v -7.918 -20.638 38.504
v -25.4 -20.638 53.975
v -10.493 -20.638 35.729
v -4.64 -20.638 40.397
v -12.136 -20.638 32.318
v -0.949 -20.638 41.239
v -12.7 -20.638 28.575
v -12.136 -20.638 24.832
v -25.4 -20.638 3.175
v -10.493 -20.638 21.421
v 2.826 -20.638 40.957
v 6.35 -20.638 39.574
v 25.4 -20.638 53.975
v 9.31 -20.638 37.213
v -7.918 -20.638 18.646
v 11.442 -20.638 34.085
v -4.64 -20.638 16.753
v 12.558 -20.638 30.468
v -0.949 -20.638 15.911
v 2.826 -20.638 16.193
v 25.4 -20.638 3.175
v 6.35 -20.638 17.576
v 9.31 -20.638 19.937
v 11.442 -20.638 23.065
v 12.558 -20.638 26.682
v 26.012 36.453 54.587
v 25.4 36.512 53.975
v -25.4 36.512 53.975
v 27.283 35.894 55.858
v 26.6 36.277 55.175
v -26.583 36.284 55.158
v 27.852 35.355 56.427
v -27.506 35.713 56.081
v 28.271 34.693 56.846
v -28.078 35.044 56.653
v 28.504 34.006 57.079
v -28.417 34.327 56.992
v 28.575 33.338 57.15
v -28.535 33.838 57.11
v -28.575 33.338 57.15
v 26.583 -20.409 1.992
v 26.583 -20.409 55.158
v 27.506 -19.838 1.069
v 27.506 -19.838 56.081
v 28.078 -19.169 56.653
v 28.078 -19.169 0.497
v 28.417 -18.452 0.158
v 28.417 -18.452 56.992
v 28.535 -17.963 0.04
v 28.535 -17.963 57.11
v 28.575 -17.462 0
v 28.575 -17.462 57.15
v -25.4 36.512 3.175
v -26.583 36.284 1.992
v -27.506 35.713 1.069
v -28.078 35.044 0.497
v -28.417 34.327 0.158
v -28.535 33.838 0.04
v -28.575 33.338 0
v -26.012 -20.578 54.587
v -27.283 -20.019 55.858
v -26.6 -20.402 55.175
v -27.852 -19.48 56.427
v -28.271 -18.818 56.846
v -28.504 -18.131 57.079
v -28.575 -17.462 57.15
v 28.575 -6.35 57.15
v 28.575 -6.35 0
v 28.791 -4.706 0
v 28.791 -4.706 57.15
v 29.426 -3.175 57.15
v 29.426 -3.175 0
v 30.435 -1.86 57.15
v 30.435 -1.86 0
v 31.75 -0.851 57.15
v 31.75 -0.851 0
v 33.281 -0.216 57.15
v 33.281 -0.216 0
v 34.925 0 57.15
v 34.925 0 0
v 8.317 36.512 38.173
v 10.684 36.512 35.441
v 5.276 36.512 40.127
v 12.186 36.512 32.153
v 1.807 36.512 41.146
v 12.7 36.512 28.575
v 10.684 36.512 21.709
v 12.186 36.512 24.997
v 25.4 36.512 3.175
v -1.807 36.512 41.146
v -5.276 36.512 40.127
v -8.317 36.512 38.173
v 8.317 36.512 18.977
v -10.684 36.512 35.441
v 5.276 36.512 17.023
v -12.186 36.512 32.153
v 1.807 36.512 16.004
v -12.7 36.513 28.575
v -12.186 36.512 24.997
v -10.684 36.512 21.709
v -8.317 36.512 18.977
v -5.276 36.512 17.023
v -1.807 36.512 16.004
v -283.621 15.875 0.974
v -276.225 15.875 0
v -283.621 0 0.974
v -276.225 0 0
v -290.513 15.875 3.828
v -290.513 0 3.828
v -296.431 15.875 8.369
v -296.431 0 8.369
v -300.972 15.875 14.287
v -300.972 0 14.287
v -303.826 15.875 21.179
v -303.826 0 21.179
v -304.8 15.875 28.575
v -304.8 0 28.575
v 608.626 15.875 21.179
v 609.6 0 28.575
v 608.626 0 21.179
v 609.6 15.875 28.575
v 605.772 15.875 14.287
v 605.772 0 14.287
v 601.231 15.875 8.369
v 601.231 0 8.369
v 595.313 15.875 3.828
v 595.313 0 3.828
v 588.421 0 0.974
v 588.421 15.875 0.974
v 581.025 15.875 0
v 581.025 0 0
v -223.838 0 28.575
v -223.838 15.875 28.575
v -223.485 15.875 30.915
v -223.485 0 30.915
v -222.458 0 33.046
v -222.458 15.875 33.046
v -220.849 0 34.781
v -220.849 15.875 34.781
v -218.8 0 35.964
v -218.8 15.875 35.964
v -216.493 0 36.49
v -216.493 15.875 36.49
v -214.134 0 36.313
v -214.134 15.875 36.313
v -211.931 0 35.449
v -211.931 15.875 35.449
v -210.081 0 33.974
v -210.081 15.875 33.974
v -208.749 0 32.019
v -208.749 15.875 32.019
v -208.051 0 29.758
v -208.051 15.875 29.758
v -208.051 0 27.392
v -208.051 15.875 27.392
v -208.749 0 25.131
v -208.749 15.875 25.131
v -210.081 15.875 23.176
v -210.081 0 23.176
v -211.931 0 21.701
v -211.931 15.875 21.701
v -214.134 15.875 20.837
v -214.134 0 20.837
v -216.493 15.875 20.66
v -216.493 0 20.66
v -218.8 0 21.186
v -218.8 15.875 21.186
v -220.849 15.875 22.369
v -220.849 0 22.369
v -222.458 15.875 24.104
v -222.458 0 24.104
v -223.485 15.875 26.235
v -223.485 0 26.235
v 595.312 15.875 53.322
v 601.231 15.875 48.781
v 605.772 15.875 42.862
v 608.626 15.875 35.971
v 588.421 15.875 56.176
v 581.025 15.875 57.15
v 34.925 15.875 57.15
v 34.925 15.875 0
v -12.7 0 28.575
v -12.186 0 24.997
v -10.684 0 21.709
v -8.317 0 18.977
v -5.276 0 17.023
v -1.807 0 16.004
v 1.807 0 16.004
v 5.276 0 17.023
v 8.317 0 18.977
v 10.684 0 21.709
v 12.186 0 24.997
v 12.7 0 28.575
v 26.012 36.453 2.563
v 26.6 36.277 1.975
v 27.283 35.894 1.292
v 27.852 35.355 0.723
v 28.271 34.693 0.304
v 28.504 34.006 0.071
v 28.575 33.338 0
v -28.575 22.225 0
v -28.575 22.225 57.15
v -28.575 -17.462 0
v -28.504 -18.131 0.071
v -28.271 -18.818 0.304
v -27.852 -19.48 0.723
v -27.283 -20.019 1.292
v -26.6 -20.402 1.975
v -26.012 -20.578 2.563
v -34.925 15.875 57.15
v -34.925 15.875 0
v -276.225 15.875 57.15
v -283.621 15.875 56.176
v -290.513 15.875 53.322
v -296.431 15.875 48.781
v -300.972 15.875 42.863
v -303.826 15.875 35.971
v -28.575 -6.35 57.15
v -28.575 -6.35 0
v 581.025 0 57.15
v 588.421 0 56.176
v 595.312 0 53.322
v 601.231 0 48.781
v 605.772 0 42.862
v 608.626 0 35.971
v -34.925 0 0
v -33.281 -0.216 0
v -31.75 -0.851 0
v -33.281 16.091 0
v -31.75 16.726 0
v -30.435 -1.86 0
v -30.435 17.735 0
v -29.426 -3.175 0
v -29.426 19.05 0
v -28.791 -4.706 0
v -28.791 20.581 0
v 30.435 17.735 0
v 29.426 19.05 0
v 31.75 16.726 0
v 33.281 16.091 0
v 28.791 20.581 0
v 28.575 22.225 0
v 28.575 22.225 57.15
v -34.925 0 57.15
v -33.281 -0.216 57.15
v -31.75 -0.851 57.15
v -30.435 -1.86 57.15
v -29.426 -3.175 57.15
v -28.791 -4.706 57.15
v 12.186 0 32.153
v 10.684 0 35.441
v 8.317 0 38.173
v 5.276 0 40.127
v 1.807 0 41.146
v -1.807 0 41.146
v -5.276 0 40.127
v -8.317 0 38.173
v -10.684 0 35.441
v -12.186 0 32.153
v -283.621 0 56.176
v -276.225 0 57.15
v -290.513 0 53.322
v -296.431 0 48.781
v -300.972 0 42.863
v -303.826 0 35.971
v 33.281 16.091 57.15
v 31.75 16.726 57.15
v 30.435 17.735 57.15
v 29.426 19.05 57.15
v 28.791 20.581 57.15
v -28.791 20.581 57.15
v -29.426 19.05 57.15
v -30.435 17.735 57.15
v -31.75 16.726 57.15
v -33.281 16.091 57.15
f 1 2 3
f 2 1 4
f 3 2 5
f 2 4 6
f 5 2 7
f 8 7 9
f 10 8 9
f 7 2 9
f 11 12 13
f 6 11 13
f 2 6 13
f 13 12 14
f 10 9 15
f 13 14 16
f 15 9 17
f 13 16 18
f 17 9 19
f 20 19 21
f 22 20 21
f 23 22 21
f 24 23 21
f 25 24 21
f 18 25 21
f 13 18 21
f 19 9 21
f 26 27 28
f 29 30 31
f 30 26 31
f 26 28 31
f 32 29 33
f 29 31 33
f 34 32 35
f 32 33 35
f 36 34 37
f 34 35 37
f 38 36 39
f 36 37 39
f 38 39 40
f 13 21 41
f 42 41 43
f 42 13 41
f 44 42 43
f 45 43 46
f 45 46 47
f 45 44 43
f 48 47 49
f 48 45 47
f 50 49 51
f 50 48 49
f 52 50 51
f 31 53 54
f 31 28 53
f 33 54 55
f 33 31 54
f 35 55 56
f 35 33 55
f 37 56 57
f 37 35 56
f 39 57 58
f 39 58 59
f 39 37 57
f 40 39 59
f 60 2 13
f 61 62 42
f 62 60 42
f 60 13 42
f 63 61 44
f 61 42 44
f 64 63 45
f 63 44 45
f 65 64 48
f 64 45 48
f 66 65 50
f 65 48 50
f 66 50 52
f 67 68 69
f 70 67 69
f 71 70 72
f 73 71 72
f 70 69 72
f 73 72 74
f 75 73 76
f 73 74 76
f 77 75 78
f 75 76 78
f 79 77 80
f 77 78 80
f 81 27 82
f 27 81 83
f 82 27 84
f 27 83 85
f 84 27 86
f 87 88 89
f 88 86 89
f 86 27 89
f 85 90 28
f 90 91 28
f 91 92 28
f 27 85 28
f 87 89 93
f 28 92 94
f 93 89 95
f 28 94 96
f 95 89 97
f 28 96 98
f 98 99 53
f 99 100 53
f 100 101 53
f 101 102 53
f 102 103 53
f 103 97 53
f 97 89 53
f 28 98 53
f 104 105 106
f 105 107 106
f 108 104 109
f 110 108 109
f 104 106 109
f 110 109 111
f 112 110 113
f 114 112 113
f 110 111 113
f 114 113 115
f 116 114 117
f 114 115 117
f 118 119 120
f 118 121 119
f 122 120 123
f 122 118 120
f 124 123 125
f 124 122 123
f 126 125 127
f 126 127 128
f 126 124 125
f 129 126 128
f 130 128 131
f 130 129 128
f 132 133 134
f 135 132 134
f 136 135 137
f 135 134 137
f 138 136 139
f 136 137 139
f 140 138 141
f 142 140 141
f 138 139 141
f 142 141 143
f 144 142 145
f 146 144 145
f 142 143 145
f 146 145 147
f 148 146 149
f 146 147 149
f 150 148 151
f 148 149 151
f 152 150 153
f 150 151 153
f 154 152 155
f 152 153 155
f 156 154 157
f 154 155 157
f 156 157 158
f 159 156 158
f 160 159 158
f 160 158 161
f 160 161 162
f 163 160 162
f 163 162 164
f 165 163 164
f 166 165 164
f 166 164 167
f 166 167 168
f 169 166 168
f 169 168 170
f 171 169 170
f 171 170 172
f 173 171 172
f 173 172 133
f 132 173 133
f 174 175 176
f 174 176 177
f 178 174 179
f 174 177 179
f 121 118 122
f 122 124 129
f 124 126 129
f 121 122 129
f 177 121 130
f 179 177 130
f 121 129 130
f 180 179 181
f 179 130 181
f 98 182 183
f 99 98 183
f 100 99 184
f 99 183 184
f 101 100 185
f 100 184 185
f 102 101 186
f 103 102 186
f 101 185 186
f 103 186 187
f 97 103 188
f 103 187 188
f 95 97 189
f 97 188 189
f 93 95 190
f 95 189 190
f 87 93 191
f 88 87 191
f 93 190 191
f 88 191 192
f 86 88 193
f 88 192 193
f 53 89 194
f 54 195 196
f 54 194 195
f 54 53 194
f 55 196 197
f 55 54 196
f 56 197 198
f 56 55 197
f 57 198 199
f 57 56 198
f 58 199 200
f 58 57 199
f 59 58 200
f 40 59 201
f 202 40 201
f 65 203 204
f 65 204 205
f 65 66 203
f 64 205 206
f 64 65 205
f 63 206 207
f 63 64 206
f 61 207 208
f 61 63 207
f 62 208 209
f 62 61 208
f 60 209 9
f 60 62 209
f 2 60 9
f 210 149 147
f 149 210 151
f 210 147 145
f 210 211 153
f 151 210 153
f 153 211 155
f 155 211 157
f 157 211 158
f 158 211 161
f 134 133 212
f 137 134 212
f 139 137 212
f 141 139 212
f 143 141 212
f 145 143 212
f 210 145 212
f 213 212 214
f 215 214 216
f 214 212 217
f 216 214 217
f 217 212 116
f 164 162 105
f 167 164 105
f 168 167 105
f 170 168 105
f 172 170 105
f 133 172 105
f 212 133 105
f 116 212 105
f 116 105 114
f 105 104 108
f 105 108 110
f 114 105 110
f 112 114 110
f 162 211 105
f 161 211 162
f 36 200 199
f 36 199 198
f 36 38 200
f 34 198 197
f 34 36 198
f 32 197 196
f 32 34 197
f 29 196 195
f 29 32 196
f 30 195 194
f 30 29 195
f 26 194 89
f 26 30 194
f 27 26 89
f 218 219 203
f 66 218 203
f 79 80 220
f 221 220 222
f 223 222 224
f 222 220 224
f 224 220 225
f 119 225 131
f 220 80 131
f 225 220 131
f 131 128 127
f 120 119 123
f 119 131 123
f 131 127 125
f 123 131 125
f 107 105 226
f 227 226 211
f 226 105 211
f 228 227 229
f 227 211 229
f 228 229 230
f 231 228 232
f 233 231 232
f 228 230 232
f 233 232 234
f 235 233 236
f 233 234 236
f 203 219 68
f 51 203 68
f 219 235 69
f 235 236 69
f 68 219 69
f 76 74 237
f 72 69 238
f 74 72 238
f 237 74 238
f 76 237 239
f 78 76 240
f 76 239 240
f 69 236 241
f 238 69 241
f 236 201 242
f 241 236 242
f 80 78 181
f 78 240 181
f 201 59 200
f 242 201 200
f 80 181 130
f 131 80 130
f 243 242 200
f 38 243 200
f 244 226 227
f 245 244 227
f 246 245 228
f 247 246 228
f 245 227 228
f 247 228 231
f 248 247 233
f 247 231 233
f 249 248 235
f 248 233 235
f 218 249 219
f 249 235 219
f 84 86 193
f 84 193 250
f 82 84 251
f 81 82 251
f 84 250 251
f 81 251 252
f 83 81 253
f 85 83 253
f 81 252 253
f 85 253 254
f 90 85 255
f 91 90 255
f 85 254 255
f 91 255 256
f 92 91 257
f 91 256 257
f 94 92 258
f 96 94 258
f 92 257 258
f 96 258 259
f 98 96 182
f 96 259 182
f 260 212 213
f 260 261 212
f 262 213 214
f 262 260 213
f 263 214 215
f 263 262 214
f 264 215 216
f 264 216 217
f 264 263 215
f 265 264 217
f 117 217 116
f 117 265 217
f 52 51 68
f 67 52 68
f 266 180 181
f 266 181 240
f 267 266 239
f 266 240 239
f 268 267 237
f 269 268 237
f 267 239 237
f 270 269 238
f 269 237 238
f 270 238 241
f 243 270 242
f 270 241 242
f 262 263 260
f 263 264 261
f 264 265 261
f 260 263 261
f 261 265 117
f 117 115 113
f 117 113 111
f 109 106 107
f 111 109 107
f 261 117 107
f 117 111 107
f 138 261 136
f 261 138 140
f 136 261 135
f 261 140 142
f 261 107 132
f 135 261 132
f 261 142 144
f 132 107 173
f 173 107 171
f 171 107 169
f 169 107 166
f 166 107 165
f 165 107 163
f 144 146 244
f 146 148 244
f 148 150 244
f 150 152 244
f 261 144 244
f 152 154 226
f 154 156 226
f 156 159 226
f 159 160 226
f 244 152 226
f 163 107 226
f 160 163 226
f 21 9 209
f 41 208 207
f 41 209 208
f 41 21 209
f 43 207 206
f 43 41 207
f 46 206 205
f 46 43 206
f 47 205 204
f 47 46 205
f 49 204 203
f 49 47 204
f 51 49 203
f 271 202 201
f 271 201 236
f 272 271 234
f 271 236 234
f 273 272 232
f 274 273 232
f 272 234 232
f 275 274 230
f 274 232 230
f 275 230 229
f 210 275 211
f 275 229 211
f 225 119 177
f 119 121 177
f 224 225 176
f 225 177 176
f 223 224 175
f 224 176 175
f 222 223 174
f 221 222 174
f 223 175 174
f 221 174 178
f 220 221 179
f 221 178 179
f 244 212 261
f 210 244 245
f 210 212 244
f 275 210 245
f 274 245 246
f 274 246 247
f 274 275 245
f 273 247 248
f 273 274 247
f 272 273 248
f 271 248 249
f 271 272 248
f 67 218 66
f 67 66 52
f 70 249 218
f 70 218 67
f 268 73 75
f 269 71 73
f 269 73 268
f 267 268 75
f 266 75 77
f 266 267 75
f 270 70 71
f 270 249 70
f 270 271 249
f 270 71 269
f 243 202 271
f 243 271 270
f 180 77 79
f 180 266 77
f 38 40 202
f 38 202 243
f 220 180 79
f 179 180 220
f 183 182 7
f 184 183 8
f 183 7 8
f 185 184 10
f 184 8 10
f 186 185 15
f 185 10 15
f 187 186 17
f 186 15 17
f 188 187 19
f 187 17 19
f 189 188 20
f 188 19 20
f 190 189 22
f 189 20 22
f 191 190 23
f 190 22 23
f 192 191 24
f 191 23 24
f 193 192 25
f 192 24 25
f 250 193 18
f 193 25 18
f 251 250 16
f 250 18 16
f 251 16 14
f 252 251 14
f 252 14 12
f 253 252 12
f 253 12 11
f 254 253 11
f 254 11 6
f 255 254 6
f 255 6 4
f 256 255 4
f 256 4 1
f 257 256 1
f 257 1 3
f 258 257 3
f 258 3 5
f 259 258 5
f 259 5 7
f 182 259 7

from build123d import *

# Parameters (mm, degrees)
F1_DEPTH = 57.15
F2_R     = 3.175
F3_R     = 28.57499
F4_R     = 28.575
F5_R     = 28.57499
F7_D     = 15.875
F8_D     = 25.4
F8_DEPTH = 38.1
F8_TIP   = 7.6309298617
F9_D     = 25.4


# Not quite as in the source:
# - a fillet or chamfer is up to 0.001 mm smaller than in the source, because OpenCascade refuses the exact size
# - a length typed as a fraction of an inch, garbled in the dataset ("3 / 203.2 mm" for 3/8 in), is restored


with BuildPart() as f1:
    # F0 (on Top) → F1 (new body)
    with BuildSketch(Plane.XY):
        with BuildLine():
            ThreePointArc((28.575, -6.35), (30.4348719395, -1.8598719395), (34.925, 0))
            Line((34.925, 0), (609.6, 0))
            Line((609.6, 0), (609.6, 15.875))
            Line((609.6, 15.875), (34.925, 15.875))
            ThreePointArc((34.925, 15.875), (30.4348719395, 17.7348719395), (28.575, 22.225))
            Line((28.575, 22.225), (28.575, 36.5125))
            Line((28.575, 36.5125), (0, 36.5125))
            Line((0, 36.5125), (-28.575, 36.5125))
            Line((-28.575, 36.5125), (-28.575, 22.225))
            ThreePointArc((-28.575, 22.225), (-30.4348719395, 17.7348719395), (-34.925, 15.875))
            Line((-34.925, 15.875), (-304.8, 15.875))
            Line((-304.8, 15.875), (-304.8, 0))
            Line((-304.8, 0), (-34.925, 0))
            ThreePointArc((-34.925, 0), (-30.4348719395, -1.8598719395), (-28.575, -6.35))
            Line((-28.575, -6.35), (-28.575, -20.6375))
            Line((-28.575, -20.6375), (0, -20.6375))
            Line((0, -20.6375), (28.575, -20.6375))
            Line((28.575, -20.6375), (28.575, -6.35))
        make_face()
    extrude(amount=F1_DEPTH)

    # F2
    f2_edges = [f1.edges().sort_by_distance(p)[0] for p in [
        (28.575, 36.5125, 28.575),
        (0, 36.5125, 57.15),
        (-28.575, 36.5125, 28.575),
        (0, 36.5125, 0),
        (-28.575, -20.6375, 28.575),
        (0, -20.6375, 57.15),
        (28.575, -20.6375, 28.575),
        (0, -20.6375, 0),
    ]]
    fillet(f2_edges, radius=F2_R)

    # F3 (radius 28.575 in the source; OpenCascade refuses exactly that, so slightly less here)
    f3_edges = [f1.edges().sort_by_distance(p)[0] for p in [
        (-304.8, 7.9375, 57.15),
        (-304.8, 7.9375, 0),
    ]]
    fillet(f3_edges, radius=F3_R)

    # F4
    f4_edges = [f1.edges().sort_by_distance(p)[0] for p in [
        (609.6, 7.9375, 57.15),
    ]]
    fillet(f4_edges, radius=F4_R)

    # F5 (radius 28.575 in the source; OpenCascade refuses exactly that, so slightly less here)
    f5_edges = [f1.edges().sort_by_distance(p)[0] for p in [
        (609.6, 7.9375, 0),
    ]]
    fillet(f5_edges, radius=F5_R)

    # F7 (through all)
    with Locations(Plane.XZ):
        with Locations((-215.9, 28.575)):
            Hole(F7_D / 2)

    # F8 (one way)
    with BuildSketch(Plane.XZ):
        with Locations((0, 28.575)):
            Circle(F8_D / 2)
    extrude(amount=-F8_DEPTH, mode=Mode.SUBTRACT)
    with Locations(Plane.XZ):
        with Locations((0, 28.575)):
            with Locations((0, 0, -(F8_DEPTH + F8_TIP / 2))):  # 118° drill point
                Cone(0, F8_D / 2, F8_TIP, mode=Mode.SUBTRACT)

    # F9 (through all)
    with Locations(Plane(origin=(0, 0, 0), x_dir=(1, 0, 0), z_dir=(0, 1, 0))):
        with Locations((0, -28.575)):
            Hole(F9_D / 2)


solid = f1.part
